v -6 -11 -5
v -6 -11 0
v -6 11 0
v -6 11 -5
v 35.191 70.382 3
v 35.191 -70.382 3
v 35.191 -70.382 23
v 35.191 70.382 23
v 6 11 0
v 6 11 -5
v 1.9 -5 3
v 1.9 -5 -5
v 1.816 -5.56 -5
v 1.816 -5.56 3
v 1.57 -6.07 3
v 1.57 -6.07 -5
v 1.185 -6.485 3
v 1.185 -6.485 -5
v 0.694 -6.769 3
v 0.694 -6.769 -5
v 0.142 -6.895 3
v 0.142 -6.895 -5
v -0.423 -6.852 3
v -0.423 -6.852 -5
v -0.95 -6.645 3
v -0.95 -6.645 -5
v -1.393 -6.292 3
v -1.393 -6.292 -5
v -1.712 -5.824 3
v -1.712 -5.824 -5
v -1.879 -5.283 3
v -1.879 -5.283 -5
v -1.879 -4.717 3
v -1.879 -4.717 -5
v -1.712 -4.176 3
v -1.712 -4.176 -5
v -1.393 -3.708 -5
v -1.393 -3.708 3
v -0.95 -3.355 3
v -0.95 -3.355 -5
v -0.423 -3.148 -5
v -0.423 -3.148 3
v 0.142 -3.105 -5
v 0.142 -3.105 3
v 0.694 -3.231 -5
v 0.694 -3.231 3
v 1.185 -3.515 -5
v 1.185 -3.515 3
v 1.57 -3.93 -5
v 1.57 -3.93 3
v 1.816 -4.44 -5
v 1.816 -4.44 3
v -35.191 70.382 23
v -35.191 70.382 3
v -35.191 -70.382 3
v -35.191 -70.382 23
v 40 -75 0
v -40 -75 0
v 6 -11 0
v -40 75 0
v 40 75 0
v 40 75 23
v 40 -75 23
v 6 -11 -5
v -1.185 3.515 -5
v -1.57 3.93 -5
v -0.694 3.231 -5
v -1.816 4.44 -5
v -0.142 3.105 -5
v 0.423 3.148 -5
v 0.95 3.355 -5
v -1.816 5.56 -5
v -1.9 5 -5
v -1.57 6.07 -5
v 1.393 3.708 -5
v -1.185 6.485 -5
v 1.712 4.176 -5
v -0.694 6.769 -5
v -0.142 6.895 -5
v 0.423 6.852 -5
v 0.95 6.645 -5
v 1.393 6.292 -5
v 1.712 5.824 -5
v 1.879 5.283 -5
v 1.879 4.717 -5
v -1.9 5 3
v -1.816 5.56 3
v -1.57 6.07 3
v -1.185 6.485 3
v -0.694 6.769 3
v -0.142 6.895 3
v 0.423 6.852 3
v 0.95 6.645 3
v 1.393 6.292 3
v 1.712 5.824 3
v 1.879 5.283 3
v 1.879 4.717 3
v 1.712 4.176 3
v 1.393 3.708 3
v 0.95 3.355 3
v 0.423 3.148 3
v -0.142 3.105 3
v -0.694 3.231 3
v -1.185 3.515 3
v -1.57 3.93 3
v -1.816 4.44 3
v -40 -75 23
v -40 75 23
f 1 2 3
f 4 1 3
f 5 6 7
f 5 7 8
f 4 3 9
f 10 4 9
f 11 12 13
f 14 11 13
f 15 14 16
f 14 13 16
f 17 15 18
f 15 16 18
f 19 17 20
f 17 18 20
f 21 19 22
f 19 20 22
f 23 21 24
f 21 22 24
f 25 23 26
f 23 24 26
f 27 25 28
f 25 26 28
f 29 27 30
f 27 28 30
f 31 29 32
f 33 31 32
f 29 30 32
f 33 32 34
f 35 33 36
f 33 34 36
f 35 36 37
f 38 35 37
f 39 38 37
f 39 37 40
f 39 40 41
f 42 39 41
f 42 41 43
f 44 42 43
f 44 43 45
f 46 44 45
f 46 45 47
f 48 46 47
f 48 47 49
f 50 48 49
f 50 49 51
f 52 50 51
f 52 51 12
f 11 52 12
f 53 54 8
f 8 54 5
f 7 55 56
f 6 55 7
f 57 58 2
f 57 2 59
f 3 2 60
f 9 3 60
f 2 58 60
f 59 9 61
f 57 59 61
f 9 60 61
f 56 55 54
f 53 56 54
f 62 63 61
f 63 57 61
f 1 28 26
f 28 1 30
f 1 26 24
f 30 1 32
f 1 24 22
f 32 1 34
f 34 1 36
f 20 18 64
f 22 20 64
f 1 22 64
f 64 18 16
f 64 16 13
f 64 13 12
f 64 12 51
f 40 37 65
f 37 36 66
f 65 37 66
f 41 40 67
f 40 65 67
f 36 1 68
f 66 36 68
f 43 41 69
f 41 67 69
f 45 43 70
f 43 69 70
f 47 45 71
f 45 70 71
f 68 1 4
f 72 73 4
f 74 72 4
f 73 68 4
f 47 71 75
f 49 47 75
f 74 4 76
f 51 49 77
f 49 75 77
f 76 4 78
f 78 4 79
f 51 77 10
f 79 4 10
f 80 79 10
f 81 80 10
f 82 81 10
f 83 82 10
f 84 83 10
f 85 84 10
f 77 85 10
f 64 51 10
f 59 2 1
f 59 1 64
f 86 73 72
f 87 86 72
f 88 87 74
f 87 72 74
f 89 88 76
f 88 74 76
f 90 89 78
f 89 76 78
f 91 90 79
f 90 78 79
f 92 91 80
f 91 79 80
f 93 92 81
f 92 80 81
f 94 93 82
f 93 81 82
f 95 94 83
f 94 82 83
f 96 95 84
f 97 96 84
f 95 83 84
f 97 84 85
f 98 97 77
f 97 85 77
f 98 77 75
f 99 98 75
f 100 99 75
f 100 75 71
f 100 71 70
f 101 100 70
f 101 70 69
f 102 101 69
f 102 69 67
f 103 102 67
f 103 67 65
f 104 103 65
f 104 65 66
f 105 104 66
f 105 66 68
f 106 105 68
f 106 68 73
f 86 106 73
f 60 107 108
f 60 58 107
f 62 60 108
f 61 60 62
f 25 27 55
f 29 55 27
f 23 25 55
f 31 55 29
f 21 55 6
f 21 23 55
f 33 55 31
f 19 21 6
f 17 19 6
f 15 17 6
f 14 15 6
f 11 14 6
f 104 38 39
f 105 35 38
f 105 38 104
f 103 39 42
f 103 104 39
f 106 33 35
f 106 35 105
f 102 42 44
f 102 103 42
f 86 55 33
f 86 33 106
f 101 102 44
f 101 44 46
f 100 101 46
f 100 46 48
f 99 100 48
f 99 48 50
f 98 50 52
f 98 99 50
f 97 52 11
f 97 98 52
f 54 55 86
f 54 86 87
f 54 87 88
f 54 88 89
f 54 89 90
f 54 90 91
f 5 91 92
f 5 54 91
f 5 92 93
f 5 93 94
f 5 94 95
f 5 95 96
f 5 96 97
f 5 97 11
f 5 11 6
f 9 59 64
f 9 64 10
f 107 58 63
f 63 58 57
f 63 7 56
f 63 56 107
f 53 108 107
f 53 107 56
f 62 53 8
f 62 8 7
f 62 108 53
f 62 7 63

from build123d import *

# Parameters (mm, degrees)
SKETCH_1_W          = 80
SKETCH_1_H          = 150
EXTRUDE_1_DEPTH     = 3
SKETCH_2_W          = 12
SKETCH_2_H          = 22
EXTRUDE_2_DEPTH     = 5
SKETCH_3_R          = 1.9
CUT_EXTRUDE_1_DEPTH = 86.375640554
SKETCH_4_W          = 80
SKETCH_4_H          = 150
SKETCH_4_W_2        = 70.382347564
SKETCH_4_H_2        = 140.764695128
EXTRUDE_3_DEPTH     = 20


with BuildPart() as part:
    # 스케치1 → 보스-돌출1 (new body)
    with BuildSketch(Plane.XY):
        Rectangle(SKETCH_1_W, SKETCH_1_H)
    extrude(amount=EXTRUDE_1_DEPTH)

    # 스케치2 → 보스-돌출2 (add)
    with BuildSketch(Plane.XY):
        Rectangle(SKETCH_2_W, SKETCH_2_H)
    extrude(amount=-EXTRUDE_2_DEPTH)

    # 스케치3 → 컷-돌출1 (cut, through all)
    with BuildSketch(Plane(origin=(0, 0, -5), x_dir=(-1, 0, 0), z_dir=(0, 0, -1))):
        with Locations((0, 5)):
            Circle(SKETCH_3_R)
        with Locations(Location((0, -5, 0), (0, 0, 180))):
            Circle(SKETCH_3_R)
    extrude(amount=-CUT_EXTRUDE_1_DEPTH, mode=Mode.SUBTRACT)

    # 스케치4 → 보스-돌출3 (add)
    with BuildSketch(Plane.XY.offset(3)):
        Rectangle(SKETCH_4_W, SKETCH_4_H)
        Rectangle(SKETCH_4_W_2, SKETCH_4_H_2, mode=Mode.SUBTRACT)
    extrude(amount=EXTRUDE_3_DEPTH)


solid = part.part
